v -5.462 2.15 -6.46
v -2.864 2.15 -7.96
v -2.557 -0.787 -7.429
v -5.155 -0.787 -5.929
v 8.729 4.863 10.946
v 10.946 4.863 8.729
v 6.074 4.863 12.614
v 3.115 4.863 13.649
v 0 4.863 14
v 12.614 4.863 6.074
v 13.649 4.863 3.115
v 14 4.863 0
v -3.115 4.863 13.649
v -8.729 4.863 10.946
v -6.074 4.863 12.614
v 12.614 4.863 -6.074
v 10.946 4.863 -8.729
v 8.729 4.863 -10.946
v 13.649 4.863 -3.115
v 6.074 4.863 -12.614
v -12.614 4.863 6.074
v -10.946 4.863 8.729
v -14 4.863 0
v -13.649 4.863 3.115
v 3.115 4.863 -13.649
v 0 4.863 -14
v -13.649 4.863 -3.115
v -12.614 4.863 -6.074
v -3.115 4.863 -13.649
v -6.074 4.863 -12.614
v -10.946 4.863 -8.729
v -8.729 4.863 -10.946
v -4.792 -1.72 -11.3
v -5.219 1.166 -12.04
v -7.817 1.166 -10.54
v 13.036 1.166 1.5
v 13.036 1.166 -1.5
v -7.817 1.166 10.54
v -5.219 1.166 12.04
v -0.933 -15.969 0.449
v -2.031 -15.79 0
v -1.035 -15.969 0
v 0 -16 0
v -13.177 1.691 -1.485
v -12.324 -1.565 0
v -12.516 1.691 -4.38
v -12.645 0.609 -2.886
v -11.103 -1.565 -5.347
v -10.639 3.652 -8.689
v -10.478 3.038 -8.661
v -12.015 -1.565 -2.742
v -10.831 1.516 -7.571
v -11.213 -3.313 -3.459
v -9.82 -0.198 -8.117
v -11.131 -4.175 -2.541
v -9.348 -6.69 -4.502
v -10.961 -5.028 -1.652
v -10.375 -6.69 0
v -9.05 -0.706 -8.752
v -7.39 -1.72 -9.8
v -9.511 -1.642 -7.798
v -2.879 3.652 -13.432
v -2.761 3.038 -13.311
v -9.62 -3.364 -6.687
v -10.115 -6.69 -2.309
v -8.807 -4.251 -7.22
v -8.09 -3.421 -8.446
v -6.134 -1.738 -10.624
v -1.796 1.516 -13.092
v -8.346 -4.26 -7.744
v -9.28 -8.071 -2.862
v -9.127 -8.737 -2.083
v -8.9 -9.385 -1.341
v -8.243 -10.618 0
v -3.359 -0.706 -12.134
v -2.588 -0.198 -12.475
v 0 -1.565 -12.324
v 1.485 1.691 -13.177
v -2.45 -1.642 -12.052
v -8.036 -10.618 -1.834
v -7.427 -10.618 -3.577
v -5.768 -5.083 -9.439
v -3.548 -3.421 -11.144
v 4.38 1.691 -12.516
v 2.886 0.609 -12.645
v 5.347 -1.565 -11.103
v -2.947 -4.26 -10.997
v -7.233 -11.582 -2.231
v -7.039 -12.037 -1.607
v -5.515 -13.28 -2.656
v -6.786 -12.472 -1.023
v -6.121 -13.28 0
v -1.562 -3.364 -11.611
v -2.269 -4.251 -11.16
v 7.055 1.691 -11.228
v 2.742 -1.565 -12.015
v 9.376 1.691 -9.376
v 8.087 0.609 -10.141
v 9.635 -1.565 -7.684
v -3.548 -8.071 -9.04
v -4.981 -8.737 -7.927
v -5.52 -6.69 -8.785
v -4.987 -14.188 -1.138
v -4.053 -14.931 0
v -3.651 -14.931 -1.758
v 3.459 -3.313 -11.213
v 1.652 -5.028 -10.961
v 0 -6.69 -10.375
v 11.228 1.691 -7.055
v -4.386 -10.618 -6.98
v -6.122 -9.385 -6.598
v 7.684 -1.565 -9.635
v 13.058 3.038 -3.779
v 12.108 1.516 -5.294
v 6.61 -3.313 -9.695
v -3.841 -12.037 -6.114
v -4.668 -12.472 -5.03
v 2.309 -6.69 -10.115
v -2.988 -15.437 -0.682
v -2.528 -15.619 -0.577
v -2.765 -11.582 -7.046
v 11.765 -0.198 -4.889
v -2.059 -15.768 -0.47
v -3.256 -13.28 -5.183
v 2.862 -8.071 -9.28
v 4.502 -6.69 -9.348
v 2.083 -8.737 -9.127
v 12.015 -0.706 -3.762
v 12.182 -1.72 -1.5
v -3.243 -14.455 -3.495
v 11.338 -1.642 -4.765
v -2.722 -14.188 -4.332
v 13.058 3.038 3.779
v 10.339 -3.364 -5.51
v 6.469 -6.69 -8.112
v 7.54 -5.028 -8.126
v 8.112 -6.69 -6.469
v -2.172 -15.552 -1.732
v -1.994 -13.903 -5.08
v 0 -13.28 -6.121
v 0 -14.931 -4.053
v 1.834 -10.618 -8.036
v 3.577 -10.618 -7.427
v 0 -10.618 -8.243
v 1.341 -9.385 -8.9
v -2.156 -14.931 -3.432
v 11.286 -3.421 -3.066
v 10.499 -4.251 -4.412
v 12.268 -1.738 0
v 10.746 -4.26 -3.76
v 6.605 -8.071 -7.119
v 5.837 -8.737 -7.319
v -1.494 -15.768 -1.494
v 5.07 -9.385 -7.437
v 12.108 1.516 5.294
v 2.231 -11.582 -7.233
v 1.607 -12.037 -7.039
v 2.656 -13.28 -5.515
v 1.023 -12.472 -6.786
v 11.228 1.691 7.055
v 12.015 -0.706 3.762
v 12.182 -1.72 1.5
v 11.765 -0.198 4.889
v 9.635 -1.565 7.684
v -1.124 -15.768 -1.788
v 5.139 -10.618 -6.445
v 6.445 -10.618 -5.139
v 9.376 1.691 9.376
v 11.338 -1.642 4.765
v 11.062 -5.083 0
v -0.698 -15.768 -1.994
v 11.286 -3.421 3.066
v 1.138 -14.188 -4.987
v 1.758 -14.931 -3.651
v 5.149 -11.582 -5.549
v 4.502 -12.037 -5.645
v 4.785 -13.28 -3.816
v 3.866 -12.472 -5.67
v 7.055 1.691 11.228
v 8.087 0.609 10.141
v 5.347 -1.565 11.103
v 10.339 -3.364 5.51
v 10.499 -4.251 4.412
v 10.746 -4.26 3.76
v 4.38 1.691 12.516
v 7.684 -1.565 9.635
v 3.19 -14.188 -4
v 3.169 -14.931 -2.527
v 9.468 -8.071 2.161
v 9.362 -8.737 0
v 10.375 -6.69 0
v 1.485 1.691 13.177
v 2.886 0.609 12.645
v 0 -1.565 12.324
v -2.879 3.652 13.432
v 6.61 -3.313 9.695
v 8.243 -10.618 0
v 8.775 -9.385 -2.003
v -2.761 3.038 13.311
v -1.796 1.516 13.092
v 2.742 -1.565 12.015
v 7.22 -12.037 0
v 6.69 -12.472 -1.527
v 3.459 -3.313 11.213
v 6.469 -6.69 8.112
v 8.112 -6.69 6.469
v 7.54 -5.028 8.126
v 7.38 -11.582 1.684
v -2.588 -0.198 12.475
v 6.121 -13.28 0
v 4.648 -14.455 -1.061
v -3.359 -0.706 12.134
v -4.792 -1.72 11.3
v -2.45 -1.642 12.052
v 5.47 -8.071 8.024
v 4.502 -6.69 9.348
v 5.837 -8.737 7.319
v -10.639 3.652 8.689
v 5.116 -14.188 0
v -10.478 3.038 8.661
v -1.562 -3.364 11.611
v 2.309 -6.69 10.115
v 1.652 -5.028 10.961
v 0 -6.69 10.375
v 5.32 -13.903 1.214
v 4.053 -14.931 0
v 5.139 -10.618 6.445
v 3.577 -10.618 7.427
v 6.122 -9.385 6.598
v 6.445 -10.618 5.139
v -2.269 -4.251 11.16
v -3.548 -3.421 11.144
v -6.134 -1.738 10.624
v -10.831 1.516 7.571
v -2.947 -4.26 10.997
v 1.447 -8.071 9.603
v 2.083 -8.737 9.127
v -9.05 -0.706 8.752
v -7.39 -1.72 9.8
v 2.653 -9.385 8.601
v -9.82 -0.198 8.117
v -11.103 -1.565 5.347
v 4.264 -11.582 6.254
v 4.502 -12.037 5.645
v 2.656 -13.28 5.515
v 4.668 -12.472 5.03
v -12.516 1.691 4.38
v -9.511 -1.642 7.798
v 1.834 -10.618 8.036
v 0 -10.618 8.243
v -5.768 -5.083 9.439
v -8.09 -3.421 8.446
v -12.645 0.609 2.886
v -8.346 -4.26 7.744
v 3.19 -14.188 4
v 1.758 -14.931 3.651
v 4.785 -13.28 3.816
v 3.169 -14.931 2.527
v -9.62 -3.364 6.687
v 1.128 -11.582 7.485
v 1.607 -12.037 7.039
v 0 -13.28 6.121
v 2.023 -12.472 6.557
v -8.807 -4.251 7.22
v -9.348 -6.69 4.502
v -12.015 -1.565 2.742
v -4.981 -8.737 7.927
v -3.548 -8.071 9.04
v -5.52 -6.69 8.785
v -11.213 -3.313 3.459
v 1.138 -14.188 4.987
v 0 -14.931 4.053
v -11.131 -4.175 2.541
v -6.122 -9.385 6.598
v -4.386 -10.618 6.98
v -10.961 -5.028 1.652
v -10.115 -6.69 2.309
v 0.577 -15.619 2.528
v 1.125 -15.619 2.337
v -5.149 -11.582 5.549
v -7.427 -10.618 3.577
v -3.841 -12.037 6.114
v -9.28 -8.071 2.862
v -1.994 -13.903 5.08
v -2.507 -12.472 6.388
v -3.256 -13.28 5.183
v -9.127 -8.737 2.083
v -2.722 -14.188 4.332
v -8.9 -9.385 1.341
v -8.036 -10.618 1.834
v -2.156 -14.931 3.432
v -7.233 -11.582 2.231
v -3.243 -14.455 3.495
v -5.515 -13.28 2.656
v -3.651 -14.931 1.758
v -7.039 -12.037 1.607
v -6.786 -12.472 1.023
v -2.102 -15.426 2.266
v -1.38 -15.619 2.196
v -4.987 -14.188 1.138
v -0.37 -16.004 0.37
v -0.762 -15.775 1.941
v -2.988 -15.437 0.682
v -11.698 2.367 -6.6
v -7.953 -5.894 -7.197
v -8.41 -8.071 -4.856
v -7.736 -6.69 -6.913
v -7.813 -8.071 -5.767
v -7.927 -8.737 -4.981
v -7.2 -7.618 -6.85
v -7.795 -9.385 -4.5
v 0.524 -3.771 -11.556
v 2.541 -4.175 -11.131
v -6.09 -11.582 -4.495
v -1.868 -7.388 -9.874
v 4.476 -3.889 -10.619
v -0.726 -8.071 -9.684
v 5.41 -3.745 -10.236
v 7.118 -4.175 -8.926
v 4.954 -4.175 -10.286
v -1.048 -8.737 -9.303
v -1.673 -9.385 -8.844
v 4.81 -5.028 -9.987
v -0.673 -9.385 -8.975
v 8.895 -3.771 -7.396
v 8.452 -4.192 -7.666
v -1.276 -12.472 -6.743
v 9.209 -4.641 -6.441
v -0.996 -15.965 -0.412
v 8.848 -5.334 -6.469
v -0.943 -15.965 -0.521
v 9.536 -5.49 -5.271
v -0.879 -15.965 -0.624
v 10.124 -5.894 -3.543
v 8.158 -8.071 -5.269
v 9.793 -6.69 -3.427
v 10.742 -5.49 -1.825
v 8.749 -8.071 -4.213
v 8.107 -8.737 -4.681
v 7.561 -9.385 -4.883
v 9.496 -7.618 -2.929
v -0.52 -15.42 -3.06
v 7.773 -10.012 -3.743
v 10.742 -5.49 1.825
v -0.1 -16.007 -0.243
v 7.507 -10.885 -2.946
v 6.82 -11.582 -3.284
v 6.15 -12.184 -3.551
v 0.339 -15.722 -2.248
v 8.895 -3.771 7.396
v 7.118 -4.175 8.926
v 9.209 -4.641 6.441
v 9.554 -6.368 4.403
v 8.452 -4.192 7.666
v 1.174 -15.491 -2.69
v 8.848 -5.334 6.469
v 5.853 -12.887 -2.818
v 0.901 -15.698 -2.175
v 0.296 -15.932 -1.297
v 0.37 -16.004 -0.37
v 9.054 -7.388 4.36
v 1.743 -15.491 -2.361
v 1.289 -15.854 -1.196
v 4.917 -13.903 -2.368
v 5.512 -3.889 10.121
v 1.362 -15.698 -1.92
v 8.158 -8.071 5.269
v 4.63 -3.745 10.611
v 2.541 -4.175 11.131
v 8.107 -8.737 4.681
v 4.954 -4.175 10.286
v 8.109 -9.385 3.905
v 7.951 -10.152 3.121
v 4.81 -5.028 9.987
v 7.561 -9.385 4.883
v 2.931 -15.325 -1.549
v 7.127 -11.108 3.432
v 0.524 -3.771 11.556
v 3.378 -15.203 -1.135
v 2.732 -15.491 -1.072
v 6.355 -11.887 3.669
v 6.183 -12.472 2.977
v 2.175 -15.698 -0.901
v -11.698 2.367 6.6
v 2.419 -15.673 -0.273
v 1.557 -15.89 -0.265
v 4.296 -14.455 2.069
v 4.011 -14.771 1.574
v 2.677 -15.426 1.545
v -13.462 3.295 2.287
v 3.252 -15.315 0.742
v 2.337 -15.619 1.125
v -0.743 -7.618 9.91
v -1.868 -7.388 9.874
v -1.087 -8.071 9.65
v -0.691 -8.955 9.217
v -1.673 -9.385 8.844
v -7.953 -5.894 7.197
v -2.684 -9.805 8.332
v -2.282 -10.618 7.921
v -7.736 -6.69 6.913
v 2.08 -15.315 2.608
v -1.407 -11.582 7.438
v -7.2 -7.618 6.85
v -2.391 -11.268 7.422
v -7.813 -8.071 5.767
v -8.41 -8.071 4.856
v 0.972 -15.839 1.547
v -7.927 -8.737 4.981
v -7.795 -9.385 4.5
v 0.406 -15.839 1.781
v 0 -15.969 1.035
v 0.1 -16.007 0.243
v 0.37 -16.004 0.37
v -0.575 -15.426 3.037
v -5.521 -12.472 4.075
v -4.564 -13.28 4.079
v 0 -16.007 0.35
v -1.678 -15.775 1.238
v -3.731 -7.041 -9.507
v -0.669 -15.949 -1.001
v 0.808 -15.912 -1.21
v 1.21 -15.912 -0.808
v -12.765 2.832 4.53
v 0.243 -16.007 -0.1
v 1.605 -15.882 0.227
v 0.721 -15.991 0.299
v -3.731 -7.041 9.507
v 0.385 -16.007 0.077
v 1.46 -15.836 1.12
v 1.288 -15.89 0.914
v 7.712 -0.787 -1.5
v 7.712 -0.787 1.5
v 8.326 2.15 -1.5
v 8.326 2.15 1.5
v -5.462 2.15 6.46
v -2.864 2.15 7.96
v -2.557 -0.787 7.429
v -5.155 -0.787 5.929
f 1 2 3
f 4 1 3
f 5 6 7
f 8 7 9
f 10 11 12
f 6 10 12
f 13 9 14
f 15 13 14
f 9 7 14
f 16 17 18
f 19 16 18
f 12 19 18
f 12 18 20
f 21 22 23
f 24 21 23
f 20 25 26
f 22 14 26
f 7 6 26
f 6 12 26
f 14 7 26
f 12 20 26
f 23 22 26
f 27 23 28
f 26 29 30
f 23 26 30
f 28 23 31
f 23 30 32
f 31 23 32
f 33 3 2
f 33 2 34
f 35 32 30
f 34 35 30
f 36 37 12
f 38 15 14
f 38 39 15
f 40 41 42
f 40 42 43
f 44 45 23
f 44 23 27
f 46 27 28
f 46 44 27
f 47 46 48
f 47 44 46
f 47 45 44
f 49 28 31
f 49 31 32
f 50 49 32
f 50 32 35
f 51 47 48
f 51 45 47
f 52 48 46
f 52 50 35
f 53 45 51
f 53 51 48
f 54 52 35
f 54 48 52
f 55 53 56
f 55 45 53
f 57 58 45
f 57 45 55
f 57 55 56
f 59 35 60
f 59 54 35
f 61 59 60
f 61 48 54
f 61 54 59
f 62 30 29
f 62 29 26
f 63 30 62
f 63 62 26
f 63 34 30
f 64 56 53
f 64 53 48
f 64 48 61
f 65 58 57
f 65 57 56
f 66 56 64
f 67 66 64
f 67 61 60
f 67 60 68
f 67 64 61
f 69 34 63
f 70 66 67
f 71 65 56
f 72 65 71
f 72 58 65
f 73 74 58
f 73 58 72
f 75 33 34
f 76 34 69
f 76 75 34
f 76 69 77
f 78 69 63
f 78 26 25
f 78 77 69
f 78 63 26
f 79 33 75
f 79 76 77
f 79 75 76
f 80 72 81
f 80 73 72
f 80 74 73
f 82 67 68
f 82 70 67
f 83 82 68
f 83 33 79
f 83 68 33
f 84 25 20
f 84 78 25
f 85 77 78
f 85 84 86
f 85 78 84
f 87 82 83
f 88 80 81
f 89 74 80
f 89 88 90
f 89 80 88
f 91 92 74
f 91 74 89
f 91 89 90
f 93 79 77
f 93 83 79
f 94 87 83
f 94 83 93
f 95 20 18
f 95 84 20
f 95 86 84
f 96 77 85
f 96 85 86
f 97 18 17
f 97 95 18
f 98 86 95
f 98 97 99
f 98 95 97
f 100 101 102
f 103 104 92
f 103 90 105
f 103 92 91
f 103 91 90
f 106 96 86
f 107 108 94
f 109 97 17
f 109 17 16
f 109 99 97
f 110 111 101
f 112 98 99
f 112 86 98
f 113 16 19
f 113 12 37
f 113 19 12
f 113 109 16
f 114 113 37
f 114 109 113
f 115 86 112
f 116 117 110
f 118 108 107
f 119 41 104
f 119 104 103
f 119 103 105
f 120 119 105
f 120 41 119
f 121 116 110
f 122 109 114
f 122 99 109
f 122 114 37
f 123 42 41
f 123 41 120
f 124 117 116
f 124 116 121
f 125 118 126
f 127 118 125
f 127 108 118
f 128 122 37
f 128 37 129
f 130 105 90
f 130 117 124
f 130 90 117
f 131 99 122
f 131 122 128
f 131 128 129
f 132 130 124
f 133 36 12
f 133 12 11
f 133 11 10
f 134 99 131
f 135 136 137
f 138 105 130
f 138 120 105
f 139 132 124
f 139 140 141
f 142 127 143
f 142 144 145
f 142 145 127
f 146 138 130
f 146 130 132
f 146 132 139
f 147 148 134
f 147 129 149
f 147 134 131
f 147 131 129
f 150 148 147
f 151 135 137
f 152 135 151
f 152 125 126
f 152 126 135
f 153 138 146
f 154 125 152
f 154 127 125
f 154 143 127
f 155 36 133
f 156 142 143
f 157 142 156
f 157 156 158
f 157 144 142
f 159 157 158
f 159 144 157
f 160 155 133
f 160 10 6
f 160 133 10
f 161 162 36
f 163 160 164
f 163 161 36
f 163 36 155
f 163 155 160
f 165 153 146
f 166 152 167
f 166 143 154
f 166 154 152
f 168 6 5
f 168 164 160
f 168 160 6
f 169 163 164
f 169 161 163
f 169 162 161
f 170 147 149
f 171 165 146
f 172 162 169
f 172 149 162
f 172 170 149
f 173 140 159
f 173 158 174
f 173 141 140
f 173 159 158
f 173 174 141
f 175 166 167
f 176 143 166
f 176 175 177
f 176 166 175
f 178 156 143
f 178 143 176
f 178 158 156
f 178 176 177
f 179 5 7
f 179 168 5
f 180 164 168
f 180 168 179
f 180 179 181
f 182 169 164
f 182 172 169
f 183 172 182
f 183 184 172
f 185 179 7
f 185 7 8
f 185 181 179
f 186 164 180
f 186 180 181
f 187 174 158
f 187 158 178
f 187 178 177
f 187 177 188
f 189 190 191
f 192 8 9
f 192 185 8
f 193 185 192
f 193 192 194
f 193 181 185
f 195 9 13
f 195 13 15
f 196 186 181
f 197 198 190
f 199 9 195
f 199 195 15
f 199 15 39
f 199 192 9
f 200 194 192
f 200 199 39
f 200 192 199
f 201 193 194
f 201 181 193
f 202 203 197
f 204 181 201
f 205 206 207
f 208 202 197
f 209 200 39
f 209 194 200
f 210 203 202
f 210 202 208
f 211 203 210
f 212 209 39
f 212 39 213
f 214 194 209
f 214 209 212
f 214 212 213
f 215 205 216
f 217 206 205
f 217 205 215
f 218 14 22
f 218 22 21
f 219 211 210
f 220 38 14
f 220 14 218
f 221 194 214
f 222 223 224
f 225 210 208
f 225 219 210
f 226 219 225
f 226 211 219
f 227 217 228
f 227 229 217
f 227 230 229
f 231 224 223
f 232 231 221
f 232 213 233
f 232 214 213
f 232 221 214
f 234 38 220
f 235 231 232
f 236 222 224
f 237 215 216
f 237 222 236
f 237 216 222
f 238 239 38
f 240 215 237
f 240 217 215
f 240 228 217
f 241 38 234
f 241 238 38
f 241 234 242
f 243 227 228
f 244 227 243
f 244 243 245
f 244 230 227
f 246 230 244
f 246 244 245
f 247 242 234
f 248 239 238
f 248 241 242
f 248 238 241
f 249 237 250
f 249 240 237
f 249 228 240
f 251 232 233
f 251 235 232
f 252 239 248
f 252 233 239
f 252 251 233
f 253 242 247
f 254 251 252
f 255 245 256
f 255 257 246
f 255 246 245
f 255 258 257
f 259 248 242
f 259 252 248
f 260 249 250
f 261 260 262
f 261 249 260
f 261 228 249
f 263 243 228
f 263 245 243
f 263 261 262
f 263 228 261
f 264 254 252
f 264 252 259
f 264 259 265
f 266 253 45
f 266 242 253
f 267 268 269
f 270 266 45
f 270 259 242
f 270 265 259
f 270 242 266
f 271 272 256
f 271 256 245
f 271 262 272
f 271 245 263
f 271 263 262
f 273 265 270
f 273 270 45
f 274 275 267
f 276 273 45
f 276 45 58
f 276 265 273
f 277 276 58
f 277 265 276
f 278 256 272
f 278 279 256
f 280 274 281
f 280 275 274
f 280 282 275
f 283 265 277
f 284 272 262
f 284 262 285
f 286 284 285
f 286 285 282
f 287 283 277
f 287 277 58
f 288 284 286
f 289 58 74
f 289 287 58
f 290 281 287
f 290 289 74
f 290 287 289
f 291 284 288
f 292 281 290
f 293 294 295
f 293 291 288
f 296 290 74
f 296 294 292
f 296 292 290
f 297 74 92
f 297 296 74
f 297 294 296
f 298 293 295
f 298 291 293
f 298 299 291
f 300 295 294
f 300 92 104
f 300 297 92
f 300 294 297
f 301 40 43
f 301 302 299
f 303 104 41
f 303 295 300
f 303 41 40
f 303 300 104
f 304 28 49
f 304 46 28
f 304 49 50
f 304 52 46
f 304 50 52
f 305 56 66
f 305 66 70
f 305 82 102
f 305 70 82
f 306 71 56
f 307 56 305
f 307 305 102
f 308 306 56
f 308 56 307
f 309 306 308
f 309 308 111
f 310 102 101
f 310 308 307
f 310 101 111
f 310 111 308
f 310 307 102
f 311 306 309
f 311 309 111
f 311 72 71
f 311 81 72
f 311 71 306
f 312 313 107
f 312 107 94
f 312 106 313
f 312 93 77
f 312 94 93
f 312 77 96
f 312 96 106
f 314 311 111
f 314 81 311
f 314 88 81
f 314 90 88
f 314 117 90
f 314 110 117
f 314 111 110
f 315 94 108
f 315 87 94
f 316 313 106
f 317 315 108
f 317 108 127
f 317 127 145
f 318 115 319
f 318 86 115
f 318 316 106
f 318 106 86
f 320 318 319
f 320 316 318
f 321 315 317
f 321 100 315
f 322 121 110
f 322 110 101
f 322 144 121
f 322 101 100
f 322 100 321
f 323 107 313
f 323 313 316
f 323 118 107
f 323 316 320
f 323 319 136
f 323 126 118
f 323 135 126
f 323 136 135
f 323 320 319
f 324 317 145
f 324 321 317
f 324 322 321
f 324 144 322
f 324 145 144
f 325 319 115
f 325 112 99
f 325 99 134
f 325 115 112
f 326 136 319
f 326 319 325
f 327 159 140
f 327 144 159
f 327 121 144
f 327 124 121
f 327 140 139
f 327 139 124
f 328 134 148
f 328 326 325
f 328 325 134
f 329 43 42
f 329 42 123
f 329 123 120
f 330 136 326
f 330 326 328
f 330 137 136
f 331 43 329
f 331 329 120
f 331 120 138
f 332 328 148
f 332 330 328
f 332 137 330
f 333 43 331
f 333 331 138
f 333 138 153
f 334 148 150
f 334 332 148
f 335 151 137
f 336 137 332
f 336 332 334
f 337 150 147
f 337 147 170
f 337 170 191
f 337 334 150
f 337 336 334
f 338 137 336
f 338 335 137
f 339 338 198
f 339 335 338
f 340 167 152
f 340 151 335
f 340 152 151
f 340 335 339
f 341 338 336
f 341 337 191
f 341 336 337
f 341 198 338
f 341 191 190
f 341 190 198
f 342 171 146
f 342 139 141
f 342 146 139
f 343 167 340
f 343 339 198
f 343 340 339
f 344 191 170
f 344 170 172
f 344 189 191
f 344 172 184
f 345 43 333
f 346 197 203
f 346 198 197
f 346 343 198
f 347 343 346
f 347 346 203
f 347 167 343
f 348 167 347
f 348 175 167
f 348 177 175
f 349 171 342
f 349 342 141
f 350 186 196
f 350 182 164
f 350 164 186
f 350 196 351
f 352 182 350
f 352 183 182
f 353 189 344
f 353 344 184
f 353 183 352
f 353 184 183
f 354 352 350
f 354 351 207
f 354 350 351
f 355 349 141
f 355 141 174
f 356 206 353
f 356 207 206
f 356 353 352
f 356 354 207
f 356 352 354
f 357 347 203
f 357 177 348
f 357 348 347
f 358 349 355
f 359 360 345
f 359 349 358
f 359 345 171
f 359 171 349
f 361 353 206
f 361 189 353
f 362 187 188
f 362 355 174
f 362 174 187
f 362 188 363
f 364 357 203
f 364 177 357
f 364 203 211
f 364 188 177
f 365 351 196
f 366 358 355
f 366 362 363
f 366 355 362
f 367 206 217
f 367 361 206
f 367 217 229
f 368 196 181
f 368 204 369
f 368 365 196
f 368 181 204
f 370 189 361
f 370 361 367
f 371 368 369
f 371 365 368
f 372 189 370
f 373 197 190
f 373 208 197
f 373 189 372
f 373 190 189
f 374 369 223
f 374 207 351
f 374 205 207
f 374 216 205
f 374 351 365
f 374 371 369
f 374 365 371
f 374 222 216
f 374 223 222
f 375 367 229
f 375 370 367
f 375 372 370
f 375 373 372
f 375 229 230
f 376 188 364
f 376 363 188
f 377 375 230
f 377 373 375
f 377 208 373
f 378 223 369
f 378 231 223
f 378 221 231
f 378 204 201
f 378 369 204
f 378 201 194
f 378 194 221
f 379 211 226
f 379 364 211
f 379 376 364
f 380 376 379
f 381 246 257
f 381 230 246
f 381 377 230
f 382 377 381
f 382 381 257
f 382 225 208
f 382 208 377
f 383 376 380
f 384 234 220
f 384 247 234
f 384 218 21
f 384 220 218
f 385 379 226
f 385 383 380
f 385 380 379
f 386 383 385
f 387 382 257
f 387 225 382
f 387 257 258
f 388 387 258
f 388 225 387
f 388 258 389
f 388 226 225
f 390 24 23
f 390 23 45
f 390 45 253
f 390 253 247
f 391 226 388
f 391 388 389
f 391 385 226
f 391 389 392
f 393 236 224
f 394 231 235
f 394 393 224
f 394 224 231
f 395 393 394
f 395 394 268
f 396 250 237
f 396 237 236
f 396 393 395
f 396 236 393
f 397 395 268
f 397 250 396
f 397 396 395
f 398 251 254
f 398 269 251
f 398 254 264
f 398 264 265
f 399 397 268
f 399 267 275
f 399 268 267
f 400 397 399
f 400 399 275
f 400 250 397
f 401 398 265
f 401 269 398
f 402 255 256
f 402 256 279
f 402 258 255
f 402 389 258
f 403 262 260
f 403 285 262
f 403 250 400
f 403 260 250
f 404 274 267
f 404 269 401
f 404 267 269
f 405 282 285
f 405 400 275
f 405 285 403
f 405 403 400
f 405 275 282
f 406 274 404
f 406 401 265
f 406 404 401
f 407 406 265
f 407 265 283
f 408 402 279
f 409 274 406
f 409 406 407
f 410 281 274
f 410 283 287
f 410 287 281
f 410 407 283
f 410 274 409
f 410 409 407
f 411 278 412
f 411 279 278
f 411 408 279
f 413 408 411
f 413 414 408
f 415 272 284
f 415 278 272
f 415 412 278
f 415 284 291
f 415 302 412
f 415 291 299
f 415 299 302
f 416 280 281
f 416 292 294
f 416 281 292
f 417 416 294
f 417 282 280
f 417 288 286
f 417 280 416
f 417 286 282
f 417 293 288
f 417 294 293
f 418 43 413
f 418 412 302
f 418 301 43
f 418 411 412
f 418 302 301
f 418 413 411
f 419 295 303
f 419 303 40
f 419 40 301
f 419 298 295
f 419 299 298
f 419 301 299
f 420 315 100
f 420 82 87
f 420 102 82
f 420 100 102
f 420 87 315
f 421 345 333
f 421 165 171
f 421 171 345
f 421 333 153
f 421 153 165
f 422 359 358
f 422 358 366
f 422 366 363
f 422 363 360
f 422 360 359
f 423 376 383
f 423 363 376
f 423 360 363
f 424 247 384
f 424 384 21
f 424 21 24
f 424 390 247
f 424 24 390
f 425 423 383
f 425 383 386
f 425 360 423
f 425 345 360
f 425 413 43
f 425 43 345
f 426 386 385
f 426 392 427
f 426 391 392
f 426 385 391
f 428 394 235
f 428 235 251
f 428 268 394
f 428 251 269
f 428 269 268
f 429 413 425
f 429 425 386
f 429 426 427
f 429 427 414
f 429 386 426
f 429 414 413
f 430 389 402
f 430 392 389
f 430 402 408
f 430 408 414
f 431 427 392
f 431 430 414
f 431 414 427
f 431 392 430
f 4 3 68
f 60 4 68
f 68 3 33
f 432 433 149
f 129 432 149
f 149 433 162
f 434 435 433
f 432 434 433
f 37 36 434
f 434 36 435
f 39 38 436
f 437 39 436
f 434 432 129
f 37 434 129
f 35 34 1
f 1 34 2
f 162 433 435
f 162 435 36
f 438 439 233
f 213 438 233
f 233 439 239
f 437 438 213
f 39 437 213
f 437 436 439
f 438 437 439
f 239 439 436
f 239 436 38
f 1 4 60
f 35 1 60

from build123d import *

# Parameters (mm, degrees)
ENL_V_MAT_EXTRU_1_DEPTH      = 1.5
R_P_TITION_CIRCULAIRE1_COUNT = 3


with BuildPart() as part:
    # Esquisse1 → Révolution1 (revolve)
    with BuildSketch(Plane.XY):
        with BuildLine():
            Line((-14, 4.86253393), (0, 4.86253393))
            Line((0, 4.86253393), (0, -16))
            add(Edge.make_bspline(
                [(-14, 4.86253393), (-12.085828485, -4.33132409), (-7.615170337, -16.338293634), (0, -16)],
                knots=[0, 0, 0, 0, 1, 1, 1, 1], degree=3))
        make_face()
    revolve(axis=Axis((0, 4.86253393, 0), (0, -1, 0)))

    # Esquisse2 → Enlèv. mat.-Extru.1 (cut, symmetric)
    with BuildSketch(Plane.XY):
        Polygon((13.219949482, 1.127759621), (8.325564148, 2.150008223), (7.712214987, -0.786622978), (12.60660032, -1.80887158), align=None)
    enl_v_mat_extru_1 = extrude(amount=ENL_V_MAT_EXTRU_1_DEPTH, both=True, mode=Mode.SUBTRACT)

    # Répétition circulaire1: Enlèv. mat.-Extru.1 ×3 about axis
    r_p_tition_circulaire1_axis = Axis((0, 4.86253393, 0), (0, 1, 0))
    for i in range(1, R_P_TITION_CIRCULAIRE1_COUNT):
        add(enl_v_mat_extru_1.rotate(r_p_tition_circulaire1_axis, i * 360 / R_P_TITION_CIRCULAIRE1_COUNT), mode=Mode.SUBTRACT)


solid = part.part
